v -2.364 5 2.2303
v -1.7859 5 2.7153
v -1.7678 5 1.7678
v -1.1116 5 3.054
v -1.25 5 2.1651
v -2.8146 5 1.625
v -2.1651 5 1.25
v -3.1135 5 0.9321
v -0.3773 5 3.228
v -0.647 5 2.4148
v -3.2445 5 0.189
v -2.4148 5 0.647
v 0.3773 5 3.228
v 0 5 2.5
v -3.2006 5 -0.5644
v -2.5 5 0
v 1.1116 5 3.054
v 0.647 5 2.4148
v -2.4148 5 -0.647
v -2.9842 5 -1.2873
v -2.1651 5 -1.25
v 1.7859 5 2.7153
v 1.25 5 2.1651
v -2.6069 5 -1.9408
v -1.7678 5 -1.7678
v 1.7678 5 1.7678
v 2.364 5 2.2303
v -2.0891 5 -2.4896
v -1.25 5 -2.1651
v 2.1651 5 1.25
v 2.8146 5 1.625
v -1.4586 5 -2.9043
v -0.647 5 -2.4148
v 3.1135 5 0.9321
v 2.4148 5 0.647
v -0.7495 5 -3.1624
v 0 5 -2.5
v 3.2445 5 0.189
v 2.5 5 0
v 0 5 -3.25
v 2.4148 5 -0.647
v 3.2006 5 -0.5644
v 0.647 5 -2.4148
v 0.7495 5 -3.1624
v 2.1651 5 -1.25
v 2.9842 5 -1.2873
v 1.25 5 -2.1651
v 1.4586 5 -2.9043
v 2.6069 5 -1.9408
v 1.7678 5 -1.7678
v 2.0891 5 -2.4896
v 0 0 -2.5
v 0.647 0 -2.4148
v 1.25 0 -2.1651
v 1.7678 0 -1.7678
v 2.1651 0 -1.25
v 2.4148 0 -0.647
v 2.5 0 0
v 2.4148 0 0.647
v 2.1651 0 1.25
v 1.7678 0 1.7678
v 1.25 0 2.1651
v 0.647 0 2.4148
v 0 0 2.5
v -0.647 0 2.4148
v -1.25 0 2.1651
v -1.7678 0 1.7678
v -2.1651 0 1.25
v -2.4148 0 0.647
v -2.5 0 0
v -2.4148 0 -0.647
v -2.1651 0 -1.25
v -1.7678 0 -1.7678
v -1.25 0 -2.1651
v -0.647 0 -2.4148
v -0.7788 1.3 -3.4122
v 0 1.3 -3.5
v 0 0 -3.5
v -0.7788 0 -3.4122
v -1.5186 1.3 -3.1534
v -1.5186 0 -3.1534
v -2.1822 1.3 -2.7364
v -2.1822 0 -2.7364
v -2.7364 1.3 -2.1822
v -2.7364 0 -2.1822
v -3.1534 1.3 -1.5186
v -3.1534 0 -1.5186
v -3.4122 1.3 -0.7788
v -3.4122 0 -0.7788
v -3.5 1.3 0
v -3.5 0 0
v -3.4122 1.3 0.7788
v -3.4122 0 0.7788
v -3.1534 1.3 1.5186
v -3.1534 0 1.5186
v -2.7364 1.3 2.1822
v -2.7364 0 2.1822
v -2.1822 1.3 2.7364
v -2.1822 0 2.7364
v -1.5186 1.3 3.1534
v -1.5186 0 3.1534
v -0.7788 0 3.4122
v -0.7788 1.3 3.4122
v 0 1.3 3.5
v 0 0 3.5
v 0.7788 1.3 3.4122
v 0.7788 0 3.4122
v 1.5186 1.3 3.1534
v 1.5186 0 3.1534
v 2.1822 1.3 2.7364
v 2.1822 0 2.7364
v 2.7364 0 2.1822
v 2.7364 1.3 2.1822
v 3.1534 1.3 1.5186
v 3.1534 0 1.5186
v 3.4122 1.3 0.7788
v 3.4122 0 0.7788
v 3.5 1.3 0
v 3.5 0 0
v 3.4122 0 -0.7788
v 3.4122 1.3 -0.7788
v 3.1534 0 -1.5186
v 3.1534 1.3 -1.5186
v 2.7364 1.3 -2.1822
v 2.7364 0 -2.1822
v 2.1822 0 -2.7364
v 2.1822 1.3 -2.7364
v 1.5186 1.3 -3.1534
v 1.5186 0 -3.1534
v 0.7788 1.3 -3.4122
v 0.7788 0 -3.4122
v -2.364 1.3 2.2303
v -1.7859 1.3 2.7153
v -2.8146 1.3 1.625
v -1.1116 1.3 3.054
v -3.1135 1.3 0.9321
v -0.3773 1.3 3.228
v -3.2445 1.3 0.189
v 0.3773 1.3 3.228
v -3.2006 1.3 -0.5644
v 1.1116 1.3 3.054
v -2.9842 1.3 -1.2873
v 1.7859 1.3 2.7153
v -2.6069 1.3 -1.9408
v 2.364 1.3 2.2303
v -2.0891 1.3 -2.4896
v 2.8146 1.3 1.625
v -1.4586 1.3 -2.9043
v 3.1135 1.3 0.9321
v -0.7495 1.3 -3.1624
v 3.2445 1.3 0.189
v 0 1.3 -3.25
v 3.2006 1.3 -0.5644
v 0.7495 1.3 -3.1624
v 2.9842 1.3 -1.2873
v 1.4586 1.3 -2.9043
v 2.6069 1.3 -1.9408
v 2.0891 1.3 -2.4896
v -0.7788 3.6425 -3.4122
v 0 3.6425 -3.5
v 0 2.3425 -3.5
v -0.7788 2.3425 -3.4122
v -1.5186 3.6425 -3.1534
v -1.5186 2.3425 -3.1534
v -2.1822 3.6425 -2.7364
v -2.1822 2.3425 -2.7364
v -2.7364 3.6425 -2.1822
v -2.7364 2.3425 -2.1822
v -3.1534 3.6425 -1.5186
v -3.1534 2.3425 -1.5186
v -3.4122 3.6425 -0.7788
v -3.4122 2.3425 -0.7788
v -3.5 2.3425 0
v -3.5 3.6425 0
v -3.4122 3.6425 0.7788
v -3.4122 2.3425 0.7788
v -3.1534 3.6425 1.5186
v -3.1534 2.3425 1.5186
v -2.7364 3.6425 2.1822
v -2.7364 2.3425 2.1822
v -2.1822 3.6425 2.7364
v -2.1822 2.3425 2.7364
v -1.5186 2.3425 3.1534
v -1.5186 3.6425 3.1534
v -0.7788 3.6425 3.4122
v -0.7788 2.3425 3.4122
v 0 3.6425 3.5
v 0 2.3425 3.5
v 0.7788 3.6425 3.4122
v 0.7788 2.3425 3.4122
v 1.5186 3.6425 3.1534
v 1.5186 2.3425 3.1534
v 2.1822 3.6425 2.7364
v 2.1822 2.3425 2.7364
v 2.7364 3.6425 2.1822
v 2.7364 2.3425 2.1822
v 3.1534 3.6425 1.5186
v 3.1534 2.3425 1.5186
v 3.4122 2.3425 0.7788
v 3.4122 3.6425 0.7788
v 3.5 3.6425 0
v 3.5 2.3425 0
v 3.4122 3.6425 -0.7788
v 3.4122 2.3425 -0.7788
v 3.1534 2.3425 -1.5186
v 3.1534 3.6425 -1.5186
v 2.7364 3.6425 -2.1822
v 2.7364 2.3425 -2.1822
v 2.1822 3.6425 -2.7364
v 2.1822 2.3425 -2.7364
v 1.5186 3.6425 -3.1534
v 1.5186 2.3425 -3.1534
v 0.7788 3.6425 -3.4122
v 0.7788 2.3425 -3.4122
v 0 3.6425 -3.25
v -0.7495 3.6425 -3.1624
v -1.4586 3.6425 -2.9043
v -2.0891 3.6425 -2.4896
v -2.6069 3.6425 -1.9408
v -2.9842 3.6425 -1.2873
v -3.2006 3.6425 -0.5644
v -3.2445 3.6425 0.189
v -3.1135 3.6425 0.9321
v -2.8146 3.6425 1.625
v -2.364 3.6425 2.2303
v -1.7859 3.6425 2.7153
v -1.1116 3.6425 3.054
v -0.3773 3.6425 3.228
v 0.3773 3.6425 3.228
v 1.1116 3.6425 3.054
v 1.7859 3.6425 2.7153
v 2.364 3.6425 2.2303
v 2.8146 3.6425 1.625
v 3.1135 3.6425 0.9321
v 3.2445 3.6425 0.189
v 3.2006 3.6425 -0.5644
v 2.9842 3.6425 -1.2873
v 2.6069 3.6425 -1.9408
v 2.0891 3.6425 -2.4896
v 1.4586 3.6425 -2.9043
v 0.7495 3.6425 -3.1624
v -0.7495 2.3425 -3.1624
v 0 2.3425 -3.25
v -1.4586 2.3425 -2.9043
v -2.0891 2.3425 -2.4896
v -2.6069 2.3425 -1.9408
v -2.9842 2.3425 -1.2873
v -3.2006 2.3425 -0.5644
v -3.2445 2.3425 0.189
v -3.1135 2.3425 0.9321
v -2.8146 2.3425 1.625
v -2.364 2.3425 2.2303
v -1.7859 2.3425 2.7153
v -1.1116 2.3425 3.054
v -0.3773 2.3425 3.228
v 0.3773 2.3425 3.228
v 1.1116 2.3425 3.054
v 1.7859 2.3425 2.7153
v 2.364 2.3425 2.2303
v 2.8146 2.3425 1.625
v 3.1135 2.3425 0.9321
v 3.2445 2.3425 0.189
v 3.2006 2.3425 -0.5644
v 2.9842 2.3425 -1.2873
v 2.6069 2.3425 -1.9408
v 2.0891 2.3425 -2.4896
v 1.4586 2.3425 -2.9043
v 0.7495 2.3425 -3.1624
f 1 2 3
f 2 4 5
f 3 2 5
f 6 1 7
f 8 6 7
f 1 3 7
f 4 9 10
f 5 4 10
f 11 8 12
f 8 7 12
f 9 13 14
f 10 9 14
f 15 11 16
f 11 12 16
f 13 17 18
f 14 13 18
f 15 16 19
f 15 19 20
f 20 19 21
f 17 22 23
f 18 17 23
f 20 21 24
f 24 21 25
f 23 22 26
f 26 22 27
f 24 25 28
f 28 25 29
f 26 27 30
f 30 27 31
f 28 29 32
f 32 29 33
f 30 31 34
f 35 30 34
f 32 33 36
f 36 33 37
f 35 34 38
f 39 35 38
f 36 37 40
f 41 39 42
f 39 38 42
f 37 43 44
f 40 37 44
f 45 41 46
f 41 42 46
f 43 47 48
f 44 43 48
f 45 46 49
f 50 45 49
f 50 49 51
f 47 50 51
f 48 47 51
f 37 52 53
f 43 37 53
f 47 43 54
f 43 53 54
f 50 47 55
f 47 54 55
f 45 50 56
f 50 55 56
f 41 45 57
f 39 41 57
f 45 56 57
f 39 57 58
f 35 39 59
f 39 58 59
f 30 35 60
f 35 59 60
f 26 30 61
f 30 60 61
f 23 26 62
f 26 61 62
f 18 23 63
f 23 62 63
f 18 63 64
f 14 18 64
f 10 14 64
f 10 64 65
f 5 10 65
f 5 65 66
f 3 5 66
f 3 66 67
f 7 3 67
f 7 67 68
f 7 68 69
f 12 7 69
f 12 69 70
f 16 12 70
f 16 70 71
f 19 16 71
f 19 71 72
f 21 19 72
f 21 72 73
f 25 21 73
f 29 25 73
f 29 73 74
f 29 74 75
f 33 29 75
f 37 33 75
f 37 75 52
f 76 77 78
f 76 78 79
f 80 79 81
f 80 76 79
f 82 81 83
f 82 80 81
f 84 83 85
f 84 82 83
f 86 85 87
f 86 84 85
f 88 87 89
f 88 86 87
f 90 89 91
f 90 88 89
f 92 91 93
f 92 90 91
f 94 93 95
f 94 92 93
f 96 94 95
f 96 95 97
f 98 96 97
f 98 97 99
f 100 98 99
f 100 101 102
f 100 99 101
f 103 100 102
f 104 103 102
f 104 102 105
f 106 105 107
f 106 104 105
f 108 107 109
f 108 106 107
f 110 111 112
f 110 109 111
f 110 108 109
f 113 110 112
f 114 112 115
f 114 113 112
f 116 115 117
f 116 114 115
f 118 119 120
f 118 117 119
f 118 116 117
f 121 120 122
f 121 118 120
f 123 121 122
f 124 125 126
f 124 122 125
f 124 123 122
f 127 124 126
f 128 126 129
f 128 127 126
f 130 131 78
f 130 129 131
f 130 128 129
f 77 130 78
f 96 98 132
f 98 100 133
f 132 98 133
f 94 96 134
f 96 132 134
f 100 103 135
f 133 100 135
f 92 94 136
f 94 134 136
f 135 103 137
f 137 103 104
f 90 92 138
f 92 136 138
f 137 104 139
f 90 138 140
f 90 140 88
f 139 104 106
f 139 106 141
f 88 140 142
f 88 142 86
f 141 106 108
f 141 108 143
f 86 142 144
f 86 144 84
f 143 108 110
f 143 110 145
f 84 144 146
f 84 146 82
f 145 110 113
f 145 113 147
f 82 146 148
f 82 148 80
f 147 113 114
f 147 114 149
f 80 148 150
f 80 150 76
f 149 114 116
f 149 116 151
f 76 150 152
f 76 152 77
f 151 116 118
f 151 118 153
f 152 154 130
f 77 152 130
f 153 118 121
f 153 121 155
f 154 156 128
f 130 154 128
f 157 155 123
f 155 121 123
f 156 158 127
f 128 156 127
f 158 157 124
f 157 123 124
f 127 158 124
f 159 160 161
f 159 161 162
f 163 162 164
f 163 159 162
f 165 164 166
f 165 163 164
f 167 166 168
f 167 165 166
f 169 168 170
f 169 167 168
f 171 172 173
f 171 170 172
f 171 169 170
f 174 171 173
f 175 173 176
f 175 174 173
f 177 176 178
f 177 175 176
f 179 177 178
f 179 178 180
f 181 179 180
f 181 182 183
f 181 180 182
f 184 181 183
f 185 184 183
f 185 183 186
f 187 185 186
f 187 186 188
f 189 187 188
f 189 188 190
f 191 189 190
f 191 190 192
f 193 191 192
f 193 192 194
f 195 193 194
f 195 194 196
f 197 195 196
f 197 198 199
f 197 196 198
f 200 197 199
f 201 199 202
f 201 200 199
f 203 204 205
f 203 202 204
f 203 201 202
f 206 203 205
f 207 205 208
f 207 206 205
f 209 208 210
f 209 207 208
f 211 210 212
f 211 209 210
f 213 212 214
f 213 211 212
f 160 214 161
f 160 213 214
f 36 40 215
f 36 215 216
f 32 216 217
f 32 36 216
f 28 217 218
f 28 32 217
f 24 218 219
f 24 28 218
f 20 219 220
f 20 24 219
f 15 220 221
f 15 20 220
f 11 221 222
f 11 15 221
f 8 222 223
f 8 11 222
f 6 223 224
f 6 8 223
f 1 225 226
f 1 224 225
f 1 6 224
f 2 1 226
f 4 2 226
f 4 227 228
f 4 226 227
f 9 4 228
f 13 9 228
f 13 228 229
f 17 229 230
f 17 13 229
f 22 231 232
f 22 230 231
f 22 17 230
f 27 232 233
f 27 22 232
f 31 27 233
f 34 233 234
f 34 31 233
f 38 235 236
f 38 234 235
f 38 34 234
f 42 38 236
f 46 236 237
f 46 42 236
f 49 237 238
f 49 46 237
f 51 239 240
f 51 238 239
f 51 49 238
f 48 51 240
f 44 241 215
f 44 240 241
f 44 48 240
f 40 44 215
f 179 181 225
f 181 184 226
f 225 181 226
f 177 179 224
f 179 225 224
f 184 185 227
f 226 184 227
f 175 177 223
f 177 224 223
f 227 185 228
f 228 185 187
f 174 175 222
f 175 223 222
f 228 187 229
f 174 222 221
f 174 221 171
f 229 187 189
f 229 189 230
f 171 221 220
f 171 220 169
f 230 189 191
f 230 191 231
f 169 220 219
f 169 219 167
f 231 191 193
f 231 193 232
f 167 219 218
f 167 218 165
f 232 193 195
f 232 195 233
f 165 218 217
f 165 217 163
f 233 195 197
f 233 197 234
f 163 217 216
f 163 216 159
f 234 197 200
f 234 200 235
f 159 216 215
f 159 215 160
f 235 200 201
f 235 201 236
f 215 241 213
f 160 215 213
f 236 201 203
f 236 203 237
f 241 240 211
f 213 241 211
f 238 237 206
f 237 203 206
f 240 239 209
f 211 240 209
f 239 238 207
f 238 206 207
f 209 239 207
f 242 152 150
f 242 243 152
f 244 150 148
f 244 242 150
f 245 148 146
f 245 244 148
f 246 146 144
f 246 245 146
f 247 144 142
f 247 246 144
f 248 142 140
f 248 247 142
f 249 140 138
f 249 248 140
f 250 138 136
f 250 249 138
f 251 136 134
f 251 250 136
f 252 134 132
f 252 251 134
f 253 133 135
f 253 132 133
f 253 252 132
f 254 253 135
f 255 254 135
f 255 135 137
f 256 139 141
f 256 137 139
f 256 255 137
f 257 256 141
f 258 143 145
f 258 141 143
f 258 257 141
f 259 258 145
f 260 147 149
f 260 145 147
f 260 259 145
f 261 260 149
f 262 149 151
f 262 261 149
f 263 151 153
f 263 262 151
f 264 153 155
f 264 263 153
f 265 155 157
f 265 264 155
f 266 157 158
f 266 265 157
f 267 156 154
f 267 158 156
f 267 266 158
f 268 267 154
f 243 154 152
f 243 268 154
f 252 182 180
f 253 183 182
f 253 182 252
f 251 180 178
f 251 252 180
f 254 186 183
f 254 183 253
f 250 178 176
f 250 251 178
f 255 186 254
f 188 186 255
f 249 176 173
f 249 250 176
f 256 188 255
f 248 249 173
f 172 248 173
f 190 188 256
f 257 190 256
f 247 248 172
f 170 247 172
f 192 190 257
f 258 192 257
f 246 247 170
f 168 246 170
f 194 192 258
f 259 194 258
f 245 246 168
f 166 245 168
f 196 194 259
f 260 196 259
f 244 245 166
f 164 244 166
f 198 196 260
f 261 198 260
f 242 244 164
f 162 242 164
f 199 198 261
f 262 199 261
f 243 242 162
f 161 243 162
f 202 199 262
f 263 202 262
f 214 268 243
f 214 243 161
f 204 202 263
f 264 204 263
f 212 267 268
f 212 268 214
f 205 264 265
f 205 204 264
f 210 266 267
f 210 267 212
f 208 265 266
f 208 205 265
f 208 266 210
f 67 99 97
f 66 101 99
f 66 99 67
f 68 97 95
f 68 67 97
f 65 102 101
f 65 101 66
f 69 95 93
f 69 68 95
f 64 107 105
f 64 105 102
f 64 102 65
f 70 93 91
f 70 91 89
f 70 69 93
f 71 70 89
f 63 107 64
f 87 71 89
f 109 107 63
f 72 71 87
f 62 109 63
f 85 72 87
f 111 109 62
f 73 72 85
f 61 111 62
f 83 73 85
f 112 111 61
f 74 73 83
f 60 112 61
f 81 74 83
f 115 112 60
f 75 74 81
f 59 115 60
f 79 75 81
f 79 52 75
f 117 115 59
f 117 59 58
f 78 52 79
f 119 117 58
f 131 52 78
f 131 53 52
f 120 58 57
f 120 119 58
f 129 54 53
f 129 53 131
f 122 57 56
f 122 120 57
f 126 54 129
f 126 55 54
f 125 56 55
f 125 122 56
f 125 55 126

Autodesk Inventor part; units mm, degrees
ref_plane "YZ Plane" through (0, 0, 0) normal (1, 0, 0) x (0, 1, 0)
ref_plane "XZ Plane" through (0, 0, 0) normal (0, 1, 0) x (-1, 0, 0)
ref_plane "XY Plane" through (0, 0, 0) normal (0, 0, 1) x (1, 0, 0)
sketch "Sketch1" plane through (0, 0, 0) normal (1, 0, 0) x (0, 1, 0)
  line L0 (0, 0) -> (0, -3.5)
  line L1 (0, -3.5) -> (1.3, -3.5)
  line L2 (1.3, -3.5) -> (1.3, -3.25)
  line L3 (1.3, -3.25) -> (2.3425, -3.25)
  line L4 (2.3425, -3.25) -> (2.3425, -3.5)
  line L5 (2.3425, -3.5) -> (3.6425, -3.5)
  line L6 (3.6425, -3.5) -> (3.6425, -3.25)
  line L7 (3.6425, -3.25) -> (5, -3.25)
  line L8 (5, -3.25) -> (5, 0)
  line L9 (5, 0) -> (0, 0)
  line L10 (5, -2.5) -> (0, -2.5)
  point P0 (1.8212, -3.25)
  dimension "d0" = 3.25
  dimension "d1" = 5
  dimension "d2" = 3.5
  dimension "d3" = 1.3
  dimension "d4" = 1.3
  dimension "d5" = 2.5
revolve "Revolution1" add sketch "Sketch1" angle 360 about axis through (0, 5, 0) along (0, -1, 0) contours L10 L8 L7 L6 L5 L4 L3 L2 L1 L0
equation "\"d4\" = d3"
properties part number "M5 heat set inserts"
